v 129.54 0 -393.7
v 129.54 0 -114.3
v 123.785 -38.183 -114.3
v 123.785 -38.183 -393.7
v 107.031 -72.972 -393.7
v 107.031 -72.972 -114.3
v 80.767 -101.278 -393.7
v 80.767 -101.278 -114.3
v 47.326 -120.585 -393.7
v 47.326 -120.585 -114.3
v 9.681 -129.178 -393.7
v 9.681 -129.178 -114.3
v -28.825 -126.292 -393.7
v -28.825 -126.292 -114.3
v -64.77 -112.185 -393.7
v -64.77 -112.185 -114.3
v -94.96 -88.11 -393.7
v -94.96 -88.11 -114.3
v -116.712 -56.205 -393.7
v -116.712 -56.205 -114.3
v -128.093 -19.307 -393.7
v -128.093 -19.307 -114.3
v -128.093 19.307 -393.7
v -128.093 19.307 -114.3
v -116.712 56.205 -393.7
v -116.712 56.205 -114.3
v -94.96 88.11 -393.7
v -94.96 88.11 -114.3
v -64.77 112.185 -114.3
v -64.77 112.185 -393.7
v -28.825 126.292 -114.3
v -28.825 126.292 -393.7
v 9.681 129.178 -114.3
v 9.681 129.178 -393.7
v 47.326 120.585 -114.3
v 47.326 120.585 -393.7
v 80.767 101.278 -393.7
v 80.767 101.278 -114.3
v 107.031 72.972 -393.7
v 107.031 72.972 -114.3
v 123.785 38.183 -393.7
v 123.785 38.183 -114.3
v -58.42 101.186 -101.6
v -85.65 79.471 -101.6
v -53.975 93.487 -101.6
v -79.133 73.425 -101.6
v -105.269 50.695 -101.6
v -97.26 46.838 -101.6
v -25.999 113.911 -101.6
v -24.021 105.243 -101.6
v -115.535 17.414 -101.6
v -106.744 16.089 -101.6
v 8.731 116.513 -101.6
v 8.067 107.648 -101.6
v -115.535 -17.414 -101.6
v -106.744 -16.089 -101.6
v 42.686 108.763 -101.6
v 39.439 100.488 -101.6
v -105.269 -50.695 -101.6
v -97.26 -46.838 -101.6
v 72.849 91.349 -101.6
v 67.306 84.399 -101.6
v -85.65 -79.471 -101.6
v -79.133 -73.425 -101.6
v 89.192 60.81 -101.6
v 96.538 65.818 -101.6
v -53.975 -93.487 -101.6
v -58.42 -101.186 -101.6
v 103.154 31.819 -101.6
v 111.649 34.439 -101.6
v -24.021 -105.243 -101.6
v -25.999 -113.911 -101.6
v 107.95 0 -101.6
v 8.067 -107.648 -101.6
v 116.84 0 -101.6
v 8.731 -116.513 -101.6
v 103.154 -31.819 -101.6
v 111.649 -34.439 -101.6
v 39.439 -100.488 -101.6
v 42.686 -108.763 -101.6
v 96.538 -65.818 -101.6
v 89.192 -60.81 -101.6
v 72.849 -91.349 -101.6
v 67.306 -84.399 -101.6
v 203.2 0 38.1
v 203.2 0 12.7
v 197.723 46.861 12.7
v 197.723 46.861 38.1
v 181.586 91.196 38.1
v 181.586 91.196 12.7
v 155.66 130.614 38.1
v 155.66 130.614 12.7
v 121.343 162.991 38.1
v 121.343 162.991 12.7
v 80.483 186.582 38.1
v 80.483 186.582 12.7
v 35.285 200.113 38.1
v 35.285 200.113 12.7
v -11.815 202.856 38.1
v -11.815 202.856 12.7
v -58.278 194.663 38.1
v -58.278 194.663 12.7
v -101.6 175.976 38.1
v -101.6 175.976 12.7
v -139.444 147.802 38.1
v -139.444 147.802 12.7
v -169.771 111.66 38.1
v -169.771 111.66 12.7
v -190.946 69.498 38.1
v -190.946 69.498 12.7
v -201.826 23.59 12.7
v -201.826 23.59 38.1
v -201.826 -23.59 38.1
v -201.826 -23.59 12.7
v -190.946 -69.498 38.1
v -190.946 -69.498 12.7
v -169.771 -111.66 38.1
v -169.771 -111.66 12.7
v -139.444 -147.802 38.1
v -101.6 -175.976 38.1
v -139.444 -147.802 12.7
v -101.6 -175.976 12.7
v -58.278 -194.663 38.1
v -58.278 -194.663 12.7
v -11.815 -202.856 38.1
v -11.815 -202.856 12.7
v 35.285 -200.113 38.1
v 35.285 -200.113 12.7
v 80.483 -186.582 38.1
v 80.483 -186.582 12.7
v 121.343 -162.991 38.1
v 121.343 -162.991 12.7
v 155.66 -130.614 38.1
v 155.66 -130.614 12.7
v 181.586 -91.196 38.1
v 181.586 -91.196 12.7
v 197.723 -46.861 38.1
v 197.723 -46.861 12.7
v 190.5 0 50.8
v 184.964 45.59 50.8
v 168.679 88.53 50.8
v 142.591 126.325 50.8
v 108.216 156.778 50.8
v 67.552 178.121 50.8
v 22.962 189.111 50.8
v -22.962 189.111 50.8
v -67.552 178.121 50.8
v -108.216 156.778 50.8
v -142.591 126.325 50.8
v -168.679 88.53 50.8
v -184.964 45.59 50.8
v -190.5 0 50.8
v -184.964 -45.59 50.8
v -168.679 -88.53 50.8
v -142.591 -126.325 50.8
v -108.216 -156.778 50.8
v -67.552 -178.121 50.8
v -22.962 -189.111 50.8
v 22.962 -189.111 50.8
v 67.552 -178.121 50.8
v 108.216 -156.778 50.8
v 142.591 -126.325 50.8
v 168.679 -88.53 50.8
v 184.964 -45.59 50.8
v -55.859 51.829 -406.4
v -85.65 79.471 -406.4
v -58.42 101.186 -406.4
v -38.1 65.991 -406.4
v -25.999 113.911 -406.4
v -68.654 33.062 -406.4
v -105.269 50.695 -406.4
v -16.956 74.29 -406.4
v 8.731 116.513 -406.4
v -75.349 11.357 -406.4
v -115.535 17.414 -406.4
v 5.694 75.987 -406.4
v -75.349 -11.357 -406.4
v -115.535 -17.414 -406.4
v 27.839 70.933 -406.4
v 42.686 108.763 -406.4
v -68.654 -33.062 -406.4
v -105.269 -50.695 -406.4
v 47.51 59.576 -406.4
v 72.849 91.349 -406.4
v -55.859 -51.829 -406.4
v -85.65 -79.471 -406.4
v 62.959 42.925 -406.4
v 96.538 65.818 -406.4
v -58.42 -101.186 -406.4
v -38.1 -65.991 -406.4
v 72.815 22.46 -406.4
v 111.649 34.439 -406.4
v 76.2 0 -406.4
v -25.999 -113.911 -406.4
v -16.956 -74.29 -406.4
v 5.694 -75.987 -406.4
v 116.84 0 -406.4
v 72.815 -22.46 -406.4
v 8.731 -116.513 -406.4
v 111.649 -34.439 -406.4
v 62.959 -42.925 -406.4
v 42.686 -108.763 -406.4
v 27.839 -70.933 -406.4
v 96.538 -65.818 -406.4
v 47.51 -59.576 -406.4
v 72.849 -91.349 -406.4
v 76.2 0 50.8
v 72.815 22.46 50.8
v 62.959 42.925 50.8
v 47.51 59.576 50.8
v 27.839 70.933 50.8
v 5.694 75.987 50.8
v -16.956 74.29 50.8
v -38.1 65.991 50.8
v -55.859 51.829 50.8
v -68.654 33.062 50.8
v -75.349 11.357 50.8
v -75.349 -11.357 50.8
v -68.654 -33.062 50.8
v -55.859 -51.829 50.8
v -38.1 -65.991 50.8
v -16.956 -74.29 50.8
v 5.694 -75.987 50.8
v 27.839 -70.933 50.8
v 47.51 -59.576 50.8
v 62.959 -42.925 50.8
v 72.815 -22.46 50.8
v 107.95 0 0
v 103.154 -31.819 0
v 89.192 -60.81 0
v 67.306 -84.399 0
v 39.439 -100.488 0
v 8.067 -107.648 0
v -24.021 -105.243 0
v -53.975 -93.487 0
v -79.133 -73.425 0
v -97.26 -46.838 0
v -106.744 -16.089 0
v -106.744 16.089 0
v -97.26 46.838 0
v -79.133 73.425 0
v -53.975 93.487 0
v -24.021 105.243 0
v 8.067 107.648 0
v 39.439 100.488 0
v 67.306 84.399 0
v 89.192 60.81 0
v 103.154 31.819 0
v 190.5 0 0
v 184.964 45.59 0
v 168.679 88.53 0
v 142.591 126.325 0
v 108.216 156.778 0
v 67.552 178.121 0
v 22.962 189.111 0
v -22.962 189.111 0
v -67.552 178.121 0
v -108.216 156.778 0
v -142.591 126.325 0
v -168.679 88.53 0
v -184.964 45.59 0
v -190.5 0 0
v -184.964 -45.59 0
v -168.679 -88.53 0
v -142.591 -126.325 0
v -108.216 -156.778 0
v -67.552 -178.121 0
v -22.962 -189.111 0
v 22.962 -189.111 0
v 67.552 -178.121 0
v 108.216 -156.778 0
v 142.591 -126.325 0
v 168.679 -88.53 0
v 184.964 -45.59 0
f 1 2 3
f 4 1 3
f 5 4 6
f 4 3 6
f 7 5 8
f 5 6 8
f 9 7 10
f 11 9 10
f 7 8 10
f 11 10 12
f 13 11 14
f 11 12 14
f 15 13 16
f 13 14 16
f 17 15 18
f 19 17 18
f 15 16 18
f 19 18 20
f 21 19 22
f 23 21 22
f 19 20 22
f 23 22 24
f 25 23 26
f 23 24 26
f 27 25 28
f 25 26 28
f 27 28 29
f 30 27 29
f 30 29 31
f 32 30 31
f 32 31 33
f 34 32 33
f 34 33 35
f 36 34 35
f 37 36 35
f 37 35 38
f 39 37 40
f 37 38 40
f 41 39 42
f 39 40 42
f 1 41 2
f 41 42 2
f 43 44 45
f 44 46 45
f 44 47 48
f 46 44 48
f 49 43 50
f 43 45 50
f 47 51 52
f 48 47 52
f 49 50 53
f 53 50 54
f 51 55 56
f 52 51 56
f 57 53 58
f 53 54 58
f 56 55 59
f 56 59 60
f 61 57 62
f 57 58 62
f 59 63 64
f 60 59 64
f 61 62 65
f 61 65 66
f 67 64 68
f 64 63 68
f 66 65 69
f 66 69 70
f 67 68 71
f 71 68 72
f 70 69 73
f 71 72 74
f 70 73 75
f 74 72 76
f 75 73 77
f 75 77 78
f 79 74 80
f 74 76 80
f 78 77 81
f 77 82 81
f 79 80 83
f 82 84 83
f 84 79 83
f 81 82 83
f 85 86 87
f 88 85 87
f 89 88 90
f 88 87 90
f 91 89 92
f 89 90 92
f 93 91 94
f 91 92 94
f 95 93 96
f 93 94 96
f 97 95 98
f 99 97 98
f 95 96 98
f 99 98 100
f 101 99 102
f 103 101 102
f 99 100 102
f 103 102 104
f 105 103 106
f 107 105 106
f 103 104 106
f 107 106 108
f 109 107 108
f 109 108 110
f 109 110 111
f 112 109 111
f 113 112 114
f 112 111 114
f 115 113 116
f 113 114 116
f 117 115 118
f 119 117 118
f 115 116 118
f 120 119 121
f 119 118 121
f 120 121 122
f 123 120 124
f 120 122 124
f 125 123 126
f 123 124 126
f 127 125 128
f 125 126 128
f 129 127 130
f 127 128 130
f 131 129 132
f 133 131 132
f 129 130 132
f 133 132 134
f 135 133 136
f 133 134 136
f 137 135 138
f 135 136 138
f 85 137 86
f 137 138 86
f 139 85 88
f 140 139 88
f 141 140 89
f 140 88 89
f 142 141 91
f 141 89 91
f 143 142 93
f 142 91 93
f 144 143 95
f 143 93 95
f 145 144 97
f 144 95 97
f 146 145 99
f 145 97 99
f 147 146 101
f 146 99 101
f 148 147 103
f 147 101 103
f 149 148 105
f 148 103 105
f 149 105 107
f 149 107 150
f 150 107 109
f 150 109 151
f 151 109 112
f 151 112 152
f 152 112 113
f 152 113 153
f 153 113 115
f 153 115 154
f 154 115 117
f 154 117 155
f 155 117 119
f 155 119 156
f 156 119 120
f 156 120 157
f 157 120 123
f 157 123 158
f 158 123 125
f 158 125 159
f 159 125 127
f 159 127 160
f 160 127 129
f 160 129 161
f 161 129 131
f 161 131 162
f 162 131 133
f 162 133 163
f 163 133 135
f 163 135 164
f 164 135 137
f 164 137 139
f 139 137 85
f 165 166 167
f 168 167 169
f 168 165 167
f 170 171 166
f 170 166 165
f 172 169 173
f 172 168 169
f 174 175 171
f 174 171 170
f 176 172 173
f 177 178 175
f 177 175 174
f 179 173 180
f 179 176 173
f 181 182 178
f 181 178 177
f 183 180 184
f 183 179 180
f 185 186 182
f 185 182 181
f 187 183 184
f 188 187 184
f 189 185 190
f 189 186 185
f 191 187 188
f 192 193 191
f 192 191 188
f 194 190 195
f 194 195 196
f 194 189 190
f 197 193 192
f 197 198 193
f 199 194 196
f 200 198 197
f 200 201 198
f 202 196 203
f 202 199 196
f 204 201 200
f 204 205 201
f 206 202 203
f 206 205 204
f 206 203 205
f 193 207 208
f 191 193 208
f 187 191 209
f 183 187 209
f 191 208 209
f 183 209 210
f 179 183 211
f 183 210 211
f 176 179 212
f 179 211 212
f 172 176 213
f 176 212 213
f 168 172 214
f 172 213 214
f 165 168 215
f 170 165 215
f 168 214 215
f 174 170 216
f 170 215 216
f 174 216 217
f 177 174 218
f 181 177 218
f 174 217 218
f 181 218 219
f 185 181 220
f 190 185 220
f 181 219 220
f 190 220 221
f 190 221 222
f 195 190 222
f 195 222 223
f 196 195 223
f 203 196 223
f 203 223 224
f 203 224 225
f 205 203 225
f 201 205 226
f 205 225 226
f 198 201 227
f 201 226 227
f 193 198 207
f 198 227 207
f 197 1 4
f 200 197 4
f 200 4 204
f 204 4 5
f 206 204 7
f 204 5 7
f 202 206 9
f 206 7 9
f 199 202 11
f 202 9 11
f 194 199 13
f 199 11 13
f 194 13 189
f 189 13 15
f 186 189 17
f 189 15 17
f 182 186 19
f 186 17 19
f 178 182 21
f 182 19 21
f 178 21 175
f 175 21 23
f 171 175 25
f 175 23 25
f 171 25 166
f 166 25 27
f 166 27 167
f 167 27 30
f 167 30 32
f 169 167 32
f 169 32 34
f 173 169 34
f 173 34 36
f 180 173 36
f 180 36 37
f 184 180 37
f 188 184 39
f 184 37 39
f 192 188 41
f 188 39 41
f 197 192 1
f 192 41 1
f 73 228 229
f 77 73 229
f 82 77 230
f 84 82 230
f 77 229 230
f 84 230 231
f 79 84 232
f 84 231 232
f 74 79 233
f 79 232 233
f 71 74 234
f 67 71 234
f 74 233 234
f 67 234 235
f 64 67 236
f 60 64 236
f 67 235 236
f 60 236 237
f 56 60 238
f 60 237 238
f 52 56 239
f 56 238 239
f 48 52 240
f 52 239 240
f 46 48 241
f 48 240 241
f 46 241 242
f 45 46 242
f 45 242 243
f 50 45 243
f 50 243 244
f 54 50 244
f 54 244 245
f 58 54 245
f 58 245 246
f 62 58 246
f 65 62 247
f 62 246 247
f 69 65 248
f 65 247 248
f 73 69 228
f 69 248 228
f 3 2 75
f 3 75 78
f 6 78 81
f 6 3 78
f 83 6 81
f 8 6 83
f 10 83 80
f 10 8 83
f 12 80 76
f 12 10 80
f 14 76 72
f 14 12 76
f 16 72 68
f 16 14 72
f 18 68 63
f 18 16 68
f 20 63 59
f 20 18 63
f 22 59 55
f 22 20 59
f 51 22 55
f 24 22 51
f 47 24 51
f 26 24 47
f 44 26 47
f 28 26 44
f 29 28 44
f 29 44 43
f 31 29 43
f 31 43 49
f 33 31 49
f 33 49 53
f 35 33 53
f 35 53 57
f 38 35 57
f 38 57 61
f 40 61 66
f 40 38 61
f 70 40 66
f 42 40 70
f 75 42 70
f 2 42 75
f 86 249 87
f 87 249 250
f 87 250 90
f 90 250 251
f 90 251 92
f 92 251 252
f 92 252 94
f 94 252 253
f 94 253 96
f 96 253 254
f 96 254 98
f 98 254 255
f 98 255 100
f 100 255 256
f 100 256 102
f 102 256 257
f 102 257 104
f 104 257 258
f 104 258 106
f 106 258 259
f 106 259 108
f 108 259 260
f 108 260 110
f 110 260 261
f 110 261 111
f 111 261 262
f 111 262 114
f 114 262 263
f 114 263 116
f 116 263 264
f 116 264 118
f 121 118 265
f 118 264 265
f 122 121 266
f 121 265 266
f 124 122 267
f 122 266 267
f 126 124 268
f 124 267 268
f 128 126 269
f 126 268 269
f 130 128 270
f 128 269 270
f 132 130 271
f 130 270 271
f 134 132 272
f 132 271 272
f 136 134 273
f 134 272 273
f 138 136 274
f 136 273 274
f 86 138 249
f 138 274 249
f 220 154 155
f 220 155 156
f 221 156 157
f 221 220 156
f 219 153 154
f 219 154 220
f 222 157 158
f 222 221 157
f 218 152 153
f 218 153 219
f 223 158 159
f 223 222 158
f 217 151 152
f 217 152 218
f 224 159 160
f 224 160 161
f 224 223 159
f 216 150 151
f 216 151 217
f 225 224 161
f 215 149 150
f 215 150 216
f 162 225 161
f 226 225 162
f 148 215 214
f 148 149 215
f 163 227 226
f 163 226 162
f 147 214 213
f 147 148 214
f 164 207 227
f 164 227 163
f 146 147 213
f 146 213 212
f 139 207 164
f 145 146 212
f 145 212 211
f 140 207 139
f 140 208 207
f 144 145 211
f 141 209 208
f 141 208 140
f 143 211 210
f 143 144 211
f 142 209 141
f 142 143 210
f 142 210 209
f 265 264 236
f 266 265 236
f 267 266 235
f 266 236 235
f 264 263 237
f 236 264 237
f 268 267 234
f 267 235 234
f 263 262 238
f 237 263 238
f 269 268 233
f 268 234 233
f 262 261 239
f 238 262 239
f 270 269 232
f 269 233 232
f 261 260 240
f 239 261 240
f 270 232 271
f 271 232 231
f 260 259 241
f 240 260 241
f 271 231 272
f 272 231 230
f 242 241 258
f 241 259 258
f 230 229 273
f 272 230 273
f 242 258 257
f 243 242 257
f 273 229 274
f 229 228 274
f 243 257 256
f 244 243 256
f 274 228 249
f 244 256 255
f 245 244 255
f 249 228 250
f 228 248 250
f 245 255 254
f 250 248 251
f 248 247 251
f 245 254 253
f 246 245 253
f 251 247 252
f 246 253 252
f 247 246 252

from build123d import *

# Parameters (mm, degrees)
F0_R     = 203.2
F1_DEPTH = 50.8
F2_R     = 107.95
F3_DEPTH = 101.6
F4_R     = 129.54
F5_DEPTH = 304.8
F6_R     = 76.2
F7_DEPTH = 457.2
F8_SIZE  = 12.7
F9_SIZE  = 12.7
F10_SIZE = 12.7


with BuildPart() as f1:
    # F0 (on Top) → F1 (new body)
    with BuildSketch(Plane.XY):
        Circle(F0_R)
    extrude(amount=F1_DEPTH)

    # F2 (on face) → F3 (join)
    with BuildSketch(Plane(origin=(0, 0, 0), x_dir=(1, 0, 0), z_dir=(0, 0, -1))):
        Circle(F2_R)
    extrude(amount=F3_DEPTH)

    # F4 (on face) → F5 (join)
    with BuildSketch(Plane(origin=(0, 0, -101.6), x_dir=(1, 0, 0), z_dir=(0, 0, -1))):
        Circle(F4_R)
    extrude(amount=F5_DEPTH)

    # F6 (on face) → F7 (cut)
    with BuildSketch(Plane.XY.offset(50.8)):
        Circle(F6_R)
    extrude(amount=-F7_DEPTH, mode=Mode.SUBTRACT)

    # F8
    f8_edges = [f1.edges().sort_by_distance(p)[0] for p in [
        (-203.2, 0, 50.8),
    ]]
    chamfer(f8_edges, length=F8_SIZE)

    # F9
    f9_edges = [f1.edges().sort_by_distance(p)[0] for p in [
        (-203.2, 0, 0),
    ]]
    chamfer(f9_edges, length=F9_SIZE)

    # F10
    f10_edges = [f1.edges().sort_by_distance(p)[0] for p in [
        (-129.54, 0, -101.6),
        (-129.54, 0, -406.4),
    ]]
    chamfer(f10_edges, length=F10_SIZE)


solid = f1.part
